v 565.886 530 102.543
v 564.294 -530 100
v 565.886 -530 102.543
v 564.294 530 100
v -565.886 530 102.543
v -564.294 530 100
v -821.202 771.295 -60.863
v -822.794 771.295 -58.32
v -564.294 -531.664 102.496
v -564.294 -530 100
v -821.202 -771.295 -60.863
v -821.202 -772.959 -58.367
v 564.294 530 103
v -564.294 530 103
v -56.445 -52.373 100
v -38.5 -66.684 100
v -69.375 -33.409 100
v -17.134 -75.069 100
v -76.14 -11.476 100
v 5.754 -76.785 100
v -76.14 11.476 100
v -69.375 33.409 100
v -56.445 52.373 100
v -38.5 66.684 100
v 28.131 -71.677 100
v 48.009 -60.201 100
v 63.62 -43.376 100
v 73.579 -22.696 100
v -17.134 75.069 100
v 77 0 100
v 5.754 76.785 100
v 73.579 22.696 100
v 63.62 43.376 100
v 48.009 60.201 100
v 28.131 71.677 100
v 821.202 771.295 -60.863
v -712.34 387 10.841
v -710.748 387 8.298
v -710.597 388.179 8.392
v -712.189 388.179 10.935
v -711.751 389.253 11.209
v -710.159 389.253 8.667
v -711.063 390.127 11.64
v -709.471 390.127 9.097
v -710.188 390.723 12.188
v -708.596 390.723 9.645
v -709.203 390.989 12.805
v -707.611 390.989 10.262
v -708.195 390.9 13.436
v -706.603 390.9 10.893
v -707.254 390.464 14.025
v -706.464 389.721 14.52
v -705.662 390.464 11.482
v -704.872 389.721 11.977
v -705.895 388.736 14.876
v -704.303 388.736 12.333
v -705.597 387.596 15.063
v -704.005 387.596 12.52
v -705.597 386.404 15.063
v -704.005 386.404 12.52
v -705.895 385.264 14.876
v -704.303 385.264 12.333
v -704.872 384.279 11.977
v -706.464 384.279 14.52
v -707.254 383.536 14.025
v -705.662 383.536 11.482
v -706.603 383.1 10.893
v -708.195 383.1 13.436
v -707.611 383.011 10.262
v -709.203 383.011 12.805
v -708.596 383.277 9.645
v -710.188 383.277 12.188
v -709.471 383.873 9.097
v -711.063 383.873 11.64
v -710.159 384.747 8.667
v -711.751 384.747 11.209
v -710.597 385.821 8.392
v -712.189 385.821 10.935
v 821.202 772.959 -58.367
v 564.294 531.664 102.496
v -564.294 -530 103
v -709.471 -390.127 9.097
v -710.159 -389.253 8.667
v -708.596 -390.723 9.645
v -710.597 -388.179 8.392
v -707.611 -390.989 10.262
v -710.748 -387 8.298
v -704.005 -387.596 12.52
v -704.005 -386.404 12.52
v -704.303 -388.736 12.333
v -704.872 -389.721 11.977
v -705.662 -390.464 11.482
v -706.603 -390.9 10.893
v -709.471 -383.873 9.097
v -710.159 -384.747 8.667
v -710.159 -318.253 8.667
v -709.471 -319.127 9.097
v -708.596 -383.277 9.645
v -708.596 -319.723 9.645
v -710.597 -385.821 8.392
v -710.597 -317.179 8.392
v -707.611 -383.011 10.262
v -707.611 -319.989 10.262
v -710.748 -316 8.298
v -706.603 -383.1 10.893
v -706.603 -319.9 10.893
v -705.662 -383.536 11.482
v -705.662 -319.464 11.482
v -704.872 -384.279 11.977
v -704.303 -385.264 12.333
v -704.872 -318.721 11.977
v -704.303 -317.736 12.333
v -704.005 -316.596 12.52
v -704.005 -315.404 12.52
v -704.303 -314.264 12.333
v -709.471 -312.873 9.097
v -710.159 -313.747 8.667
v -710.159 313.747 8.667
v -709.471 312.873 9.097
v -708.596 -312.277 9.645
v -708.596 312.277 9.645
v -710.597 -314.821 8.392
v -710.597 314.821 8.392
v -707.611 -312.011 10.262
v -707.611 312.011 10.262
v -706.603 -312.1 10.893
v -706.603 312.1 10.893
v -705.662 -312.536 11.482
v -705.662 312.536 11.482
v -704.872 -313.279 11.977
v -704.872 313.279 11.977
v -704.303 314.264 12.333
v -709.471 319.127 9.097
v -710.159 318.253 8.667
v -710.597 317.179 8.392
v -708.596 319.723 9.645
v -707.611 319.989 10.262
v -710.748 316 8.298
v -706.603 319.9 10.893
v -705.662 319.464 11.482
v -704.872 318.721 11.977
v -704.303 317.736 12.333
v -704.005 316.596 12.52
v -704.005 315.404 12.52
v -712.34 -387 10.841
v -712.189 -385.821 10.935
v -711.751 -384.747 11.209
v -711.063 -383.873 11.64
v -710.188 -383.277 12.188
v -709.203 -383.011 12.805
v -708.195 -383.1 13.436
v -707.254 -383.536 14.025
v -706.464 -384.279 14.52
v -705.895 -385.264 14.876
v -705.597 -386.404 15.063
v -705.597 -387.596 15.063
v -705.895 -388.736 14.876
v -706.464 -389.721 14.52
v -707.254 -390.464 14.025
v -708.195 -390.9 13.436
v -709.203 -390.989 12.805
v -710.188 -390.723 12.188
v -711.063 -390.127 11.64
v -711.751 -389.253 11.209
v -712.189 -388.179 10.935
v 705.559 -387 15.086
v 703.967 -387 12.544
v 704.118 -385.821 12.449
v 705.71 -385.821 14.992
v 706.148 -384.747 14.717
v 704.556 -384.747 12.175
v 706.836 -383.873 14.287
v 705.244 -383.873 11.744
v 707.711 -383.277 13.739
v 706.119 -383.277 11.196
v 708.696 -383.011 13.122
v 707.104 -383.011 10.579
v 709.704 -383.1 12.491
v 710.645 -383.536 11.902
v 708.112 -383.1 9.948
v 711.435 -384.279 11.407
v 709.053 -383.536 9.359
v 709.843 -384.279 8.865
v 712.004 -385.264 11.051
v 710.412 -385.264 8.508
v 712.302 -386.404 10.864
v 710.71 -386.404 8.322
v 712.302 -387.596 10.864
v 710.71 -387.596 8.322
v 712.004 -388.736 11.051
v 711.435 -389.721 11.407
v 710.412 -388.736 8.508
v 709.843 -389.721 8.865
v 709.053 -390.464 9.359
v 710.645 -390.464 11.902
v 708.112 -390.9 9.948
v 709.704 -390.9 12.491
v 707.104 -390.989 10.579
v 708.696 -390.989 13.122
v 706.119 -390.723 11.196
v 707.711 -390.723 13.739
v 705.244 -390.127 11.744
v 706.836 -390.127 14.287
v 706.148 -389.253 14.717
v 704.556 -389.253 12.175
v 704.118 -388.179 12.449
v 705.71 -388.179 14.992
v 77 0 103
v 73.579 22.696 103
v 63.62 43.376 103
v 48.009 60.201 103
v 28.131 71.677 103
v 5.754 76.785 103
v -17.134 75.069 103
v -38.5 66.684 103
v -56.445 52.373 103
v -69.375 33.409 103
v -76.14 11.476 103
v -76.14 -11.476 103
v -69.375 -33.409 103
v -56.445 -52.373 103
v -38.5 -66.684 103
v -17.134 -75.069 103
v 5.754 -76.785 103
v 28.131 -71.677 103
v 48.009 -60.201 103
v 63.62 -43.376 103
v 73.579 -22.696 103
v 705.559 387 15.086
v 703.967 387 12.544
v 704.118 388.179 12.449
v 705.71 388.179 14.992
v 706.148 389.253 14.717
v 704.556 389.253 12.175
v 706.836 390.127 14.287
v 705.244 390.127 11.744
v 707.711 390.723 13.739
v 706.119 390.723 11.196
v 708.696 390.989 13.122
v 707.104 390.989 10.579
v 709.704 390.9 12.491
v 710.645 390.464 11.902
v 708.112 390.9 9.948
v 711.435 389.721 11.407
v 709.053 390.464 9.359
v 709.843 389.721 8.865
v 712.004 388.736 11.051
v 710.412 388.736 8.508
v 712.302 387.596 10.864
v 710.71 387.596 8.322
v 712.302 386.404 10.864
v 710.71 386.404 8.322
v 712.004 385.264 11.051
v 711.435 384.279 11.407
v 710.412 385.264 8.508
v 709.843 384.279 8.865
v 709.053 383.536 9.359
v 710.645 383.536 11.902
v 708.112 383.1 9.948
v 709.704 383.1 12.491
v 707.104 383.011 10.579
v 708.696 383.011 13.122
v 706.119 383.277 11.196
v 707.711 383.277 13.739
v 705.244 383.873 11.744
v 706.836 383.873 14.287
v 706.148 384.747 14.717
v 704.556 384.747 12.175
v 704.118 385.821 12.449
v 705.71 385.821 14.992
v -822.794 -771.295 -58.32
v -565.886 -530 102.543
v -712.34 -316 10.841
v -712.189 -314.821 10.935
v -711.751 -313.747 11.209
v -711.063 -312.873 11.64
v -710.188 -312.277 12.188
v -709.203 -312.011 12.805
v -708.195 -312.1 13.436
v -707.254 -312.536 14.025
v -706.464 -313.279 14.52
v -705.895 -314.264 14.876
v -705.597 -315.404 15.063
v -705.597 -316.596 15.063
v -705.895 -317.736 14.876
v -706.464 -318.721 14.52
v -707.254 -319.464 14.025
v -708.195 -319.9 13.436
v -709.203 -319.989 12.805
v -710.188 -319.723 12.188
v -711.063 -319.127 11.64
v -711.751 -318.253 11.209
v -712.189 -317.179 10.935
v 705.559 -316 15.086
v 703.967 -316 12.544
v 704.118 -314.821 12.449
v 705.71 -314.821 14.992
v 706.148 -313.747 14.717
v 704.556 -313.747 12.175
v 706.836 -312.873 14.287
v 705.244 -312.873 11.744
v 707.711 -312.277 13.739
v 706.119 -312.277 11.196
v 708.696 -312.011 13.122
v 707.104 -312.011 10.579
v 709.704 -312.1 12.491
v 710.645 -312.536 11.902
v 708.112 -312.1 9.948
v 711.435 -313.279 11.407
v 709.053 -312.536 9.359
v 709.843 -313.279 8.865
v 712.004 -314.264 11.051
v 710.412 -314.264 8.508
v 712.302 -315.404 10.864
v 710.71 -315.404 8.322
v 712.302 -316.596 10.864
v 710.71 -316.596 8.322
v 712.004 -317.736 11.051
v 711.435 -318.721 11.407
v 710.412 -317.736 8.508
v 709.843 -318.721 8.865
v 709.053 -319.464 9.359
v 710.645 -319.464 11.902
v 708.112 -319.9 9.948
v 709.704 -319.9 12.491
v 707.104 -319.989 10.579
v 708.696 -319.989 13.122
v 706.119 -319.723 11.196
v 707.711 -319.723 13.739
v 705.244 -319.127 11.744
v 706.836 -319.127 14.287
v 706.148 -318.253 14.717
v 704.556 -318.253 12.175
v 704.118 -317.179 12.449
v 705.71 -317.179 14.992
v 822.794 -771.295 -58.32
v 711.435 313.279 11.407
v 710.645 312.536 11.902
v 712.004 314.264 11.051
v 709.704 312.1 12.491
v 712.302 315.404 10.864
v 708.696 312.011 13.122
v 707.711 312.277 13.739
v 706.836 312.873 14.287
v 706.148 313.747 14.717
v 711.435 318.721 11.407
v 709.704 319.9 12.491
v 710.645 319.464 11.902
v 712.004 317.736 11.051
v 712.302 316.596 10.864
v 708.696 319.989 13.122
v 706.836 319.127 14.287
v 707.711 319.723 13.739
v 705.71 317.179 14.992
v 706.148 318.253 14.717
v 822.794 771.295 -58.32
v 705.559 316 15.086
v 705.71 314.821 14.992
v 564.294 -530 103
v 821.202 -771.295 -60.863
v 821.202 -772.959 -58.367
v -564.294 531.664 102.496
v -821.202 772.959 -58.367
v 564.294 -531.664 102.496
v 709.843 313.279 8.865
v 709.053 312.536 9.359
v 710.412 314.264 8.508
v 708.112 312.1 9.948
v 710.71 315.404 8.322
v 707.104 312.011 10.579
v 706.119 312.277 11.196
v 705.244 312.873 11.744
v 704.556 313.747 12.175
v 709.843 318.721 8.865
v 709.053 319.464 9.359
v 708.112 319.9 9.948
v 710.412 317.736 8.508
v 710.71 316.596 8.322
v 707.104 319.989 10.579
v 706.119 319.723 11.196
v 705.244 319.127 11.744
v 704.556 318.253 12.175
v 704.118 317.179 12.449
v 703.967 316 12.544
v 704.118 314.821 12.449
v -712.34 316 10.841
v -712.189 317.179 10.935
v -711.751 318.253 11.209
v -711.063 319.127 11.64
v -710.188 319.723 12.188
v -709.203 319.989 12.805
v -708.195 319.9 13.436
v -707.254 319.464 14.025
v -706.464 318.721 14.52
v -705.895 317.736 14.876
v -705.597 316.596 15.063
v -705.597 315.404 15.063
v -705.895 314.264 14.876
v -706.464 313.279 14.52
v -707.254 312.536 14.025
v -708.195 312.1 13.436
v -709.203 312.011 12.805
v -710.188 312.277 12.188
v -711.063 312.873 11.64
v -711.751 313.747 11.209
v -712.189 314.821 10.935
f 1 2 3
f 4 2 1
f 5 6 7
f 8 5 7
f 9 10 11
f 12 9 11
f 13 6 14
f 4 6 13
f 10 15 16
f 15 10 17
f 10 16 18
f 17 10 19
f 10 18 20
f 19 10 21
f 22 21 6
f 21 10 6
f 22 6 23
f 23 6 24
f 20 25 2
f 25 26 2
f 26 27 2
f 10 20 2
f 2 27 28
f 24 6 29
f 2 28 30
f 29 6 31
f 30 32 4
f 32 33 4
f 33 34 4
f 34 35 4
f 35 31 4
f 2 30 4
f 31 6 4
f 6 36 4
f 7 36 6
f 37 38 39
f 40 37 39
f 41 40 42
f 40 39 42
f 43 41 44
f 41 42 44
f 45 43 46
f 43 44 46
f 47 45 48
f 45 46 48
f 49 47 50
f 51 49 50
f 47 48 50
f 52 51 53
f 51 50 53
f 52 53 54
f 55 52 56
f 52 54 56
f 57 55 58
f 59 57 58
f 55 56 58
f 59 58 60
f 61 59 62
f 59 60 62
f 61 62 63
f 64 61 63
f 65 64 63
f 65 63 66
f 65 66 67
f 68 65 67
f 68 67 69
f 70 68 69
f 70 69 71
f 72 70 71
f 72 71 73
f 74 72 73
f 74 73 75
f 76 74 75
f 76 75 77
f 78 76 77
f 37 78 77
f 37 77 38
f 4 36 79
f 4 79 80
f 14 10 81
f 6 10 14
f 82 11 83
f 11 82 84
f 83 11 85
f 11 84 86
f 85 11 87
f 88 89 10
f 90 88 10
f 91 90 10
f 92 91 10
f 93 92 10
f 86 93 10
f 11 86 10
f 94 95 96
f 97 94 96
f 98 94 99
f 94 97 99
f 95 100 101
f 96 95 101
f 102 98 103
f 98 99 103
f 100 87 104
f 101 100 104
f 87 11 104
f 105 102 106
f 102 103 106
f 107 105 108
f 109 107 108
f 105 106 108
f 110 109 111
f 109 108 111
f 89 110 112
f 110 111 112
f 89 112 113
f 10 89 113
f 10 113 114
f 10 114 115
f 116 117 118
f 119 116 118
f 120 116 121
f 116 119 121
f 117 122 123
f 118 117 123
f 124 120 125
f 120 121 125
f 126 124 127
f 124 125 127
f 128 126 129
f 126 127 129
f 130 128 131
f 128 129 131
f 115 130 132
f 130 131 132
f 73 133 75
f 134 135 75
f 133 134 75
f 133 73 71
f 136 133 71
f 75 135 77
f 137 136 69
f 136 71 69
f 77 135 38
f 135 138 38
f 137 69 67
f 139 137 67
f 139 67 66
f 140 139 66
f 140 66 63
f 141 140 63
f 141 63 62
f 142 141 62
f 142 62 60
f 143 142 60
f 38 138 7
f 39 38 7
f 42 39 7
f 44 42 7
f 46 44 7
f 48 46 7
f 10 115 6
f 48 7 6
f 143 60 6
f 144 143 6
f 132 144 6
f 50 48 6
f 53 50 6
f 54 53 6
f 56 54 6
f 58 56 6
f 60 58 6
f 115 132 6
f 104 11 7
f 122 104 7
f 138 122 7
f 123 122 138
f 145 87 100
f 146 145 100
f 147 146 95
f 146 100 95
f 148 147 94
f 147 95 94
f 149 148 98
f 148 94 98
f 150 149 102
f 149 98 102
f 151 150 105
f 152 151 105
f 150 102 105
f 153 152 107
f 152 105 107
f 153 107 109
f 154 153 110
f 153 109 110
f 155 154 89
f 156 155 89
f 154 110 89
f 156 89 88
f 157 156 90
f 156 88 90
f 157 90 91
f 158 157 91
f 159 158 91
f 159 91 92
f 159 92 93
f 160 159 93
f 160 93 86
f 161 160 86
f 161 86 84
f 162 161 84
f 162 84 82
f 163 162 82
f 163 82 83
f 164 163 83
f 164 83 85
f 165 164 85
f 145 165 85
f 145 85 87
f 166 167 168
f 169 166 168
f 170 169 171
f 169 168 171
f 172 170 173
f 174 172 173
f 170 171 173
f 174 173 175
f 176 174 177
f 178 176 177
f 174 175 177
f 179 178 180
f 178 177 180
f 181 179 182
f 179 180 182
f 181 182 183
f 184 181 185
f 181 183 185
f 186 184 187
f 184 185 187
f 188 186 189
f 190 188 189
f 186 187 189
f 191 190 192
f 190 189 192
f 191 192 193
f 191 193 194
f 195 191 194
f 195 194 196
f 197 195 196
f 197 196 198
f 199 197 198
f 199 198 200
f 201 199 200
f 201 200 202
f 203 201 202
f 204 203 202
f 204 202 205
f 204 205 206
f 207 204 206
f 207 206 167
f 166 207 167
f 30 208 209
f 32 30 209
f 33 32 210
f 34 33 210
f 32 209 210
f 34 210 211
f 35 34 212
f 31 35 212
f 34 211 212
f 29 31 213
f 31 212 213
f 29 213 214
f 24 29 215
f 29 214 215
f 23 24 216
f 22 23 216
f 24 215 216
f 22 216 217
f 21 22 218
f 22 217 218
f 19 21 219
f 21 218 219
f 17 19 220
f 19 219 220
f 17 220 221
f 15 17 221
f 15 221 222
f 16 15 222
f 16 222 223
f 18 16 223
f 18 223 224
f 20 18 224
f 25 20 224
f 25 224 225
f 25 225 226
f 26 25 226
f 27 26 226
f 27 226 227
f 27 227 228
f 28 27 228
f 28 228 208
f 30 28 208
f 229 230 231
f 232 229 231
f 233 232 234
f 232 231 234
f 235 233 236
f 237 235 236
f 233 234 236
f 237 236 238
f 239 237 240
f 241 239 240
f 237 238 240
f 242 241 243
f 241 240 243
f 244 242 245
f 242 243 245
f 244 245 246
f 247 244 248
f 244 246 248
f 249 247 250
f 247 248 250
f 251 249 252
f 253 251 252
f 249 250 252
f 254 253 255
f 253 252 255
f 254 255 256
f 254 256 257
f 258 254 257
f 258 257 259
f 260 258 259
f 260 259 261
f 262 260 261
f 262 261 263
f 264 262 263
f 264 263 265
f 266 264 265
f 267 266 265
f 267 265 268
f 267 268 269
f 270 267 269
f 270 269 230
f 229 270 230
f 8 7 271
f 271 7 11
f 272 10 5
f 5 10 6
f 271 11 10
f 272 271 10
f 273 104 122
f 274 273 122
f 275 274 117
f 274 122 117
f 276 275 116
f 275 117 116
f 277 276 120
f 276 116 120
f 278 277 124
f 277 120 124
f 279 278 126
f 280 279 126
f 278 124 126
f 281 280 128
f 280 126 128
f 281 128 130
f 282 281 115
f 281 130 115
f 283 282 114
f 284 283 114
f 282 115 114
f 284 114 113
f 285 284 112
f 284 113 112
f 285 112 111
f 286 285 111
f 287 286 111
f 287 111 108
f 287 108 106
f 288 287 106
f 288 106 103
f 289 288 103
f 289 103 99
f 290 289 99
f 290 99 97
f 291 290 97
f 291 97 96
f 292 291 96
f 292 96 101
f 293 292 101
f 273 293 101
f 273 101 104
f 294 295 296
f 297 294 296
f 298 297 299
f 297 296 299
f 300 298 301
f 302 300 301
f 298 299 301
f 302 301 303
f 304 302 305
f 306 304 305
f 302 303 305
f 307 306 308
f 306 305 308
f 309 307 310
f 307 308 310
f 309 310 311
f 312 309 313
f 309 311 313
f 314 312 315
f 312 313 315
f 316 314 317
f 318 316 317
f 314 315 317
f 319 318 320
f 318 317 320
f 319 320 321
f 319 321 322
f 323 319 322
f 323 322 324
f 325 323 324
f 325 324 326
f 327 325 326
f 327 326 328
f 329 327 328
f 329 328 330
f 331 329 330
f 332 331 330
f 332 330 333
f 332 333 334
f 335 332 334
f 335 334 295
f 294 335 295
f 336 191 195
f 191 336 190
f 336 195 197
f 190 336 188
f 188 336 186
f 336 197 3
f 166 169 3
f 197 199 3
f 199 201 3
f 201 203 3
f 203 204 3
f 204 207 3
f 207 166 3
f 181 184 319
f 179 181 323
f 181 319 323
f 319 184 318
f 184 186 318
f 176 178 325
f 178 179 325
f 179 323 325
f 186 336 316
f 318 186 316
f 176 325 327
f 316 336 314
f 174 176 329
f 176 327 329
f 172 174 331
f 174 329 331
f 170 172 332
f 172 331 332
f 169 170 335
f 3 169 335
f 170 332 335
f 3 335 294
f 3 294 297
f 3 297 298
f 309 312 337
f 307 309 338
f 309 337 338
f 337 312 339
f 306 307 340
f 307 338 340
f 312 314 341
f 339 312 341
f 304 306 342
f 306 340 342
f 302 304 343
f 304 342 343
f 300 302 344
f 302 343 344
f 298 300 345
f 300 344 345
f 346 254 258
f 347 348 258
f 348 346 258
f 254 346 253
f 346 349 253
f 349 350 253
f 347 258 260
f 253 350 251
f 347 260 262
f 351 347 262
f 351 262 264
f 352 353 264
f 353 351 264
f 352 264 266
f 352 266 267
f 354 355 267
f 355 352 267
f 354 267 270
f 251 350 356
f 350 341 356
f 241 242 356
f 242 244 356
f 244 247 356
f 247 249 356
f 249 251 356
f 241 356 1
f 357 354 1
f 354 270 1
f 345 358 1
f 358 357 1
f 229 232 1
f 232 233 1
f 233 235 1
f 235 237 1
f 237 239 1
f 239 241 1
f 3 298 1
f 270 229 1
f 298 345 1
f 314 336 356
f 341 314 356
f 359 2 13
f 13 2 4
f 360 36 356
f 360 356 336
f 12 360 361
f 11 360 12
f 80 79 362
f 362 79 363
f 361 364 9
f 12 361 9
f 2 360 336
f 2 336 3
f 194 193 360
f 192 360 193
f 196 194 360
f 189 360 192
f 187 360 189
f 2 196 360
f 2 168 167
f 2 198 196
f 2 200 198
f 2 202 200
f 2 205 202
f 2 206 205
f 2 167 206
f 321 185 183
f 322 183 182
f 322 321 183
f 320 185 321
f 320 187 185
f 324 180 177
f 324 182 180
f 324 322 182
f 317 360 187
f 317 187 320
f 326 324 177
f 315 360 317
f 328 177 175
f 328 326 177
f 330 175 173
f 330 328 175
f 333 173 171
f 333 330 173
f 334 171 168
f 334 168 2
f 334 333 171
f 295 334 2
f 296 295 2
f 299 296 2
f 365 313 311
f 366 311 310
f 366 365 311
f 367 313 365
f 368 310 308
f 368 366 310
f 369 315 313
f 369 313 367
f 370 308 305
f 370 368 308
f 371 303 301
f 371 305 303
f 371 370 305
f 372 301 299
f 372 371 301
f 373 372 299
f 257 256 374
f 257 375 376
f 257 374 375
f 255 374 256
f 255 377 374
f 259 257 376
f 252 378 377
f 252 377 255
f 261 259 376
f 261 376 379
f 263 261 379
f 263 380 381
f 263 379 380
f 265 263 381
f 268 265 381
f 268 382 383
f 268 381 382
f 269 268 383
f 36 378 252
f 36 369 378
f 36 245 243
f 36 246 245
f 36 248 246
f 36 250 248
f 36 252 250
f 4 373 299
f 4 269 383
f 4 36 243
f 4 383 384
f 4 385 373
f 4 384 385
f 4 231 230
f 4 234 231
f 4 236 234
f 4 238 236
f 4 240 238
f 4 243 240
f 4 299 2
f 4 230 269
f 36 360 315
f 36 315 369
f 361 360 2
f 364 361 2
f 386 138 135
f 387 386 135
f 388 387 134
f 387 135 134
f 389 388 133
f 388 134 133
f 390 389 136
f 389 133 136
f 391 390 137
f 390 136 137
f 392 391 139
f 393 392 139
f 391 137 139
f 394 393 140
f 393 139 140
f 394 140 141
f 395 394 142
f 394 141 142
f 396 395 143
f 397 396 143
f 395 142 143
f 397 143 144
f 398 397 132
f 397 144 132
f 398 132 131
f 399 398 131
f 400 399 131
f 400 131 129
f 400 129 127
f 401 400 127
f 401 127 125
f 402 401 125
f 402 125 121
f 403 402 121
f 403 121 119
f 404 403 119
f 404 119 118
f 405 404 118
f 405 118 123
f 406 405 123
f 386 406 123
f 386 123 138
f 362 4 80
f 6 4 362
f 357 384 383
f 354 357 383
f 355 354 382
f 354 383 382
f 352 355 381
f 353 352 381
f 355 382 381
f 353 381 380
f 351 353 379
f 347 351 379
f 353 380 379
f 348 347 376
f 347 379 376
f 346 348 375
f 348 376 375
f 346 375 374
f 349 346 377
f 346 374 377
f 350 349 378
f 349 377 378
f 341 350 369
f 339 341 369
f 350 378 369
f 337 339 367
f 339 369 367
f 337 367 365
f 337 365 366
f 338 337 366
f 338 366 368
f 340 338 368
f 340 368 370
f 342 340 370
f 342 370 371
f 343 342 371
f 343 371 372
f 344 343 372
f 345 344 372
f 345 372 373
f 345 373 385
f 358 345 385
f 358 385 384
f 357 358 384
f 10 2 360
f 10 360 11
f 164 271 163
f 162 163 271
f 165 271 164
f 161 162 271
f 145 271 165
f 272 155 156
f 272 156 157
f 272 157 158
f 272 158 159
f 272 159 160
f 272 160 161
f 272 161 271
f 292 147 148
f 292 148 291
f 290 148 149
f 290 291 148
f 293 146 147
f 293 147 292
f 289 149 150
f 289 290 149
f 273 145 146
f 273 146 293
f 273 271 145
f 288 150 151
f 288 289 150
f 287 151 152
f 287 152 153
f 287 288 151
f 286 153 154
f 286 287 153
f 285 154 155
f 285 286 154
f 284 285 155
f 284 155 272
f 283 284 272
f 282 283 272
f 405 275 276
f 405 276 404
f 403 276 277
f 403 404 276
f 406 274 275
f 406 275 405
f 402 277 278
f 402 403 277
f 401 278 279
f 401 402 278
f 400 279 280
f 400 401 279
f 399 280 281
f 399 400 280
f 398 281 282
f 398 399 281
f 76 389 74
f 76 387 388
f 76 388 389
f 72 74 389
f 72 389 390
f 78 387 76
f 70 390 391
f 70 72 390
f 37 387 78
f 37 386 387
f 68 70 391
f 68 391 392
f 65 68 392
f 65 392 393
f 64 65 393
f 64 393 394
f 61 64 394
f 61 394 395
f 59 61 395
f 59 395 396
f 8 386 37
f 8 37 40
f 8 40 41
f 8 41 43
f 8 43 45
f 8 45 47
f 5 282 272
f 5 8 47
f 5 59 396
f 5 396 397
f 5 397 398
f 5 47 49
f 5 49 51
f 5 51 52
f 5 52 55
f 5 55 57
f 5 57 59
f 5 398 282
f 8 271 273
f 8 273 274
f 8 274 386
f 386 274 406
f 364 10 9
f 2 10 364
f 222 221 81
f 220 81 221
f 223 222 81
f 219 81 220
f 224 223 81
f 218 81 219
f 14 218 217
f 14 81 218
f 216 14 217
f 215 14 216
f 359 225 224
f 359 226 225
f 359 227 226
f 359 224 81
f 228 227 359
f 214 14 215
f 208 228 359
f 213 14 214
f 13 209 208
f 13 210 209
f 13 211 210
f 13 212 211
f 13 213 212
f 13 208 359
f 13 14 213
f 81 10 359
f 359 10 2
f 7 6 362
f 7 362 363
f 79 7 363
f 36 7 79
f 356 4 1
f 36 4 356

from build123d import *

# Parameters (mm, degrees)
BOSS_EXTRUDE1_DEPTH = 3
BOSS_EXTRUDE2_DEPTH = 3
BOSS_EXTRUDE3_DEPTH = 3
BOSS_EXTRUDE4_DEPTH = 3
SKETCH7_W           = 1128.588235294
SKETCH7_H           = 1060
BOSS_EXTRUDE5_DEPTH = 3
SKETCH9_R           = 4
CUT_EXTRUDE2_DEPTH  = 1343.006459444
SKETCH10_R          = 4
CUT_EXTRUDE3_DEPTH  = 1343.006459444
SKETCH11_R          = 77
CUT_EXTRUDE4_DEPTH  = 1141.74807468


with BuildPart() as part:
    # Sketch3 → Boss-Extrude1 (new body)
    with BuildSketch(Plane(origin=(0, -209.230769231, 313.846153846), x_dir=(1, 0, 0), z_dir=(0, -0.554700196225229, 0.8320502943378437))):
        Polygon((-564.294117647, -385.516636377), (564.294117647, -385.516636377), (724, -565.79420015), (821.201882058, -675.516636377), (-821.201882058, -675.516636377), (-724, -565.79420015), align=None)
    extrude(amount=BOSS_EXTRUDE1_DEPTH)


with BuildPart() as body_2:
    # Sketch4 → Boss-Extrude2 (new body)
    with BuildSketch(Plane(origin=(-203.909377292, 0, 325.655270204), x_dir=(-0.8475595635030612, 0, -0.5307002791731887), z_dir=(0.5307002791731887, 0, -0.8475595635030612))):
        Polygon((425.202848123, -530), (425.202848123, 530), (728.317549996, 771.294585358), (728.317549996, -771.294585358), align=None)
    extrude(amount=-BOSS_EXTRUDE2_DEPTH)

    # Sketch10 → Cut-Extrude3 (cut, through all)
    with BuildSketch(Plane(origin=(-203.909377292, 0, 325.655270204), x_dir=(-0.8475595635030612, 0, -0.5307002791731887), z_dir=(0.5307002791731887, 0, -0.8475595635030612))):
        with Locations((593.997278026, -387)):
            Circle(SKETCH10_R)
        with Locations((593.997278026, -316)):
            Circle(SKETCH10_R)
        with Locations((593.997278026, 316)):
            Circle(SKETCH10_R)
        with Locations((593.997278026, 387)):
            Circle(SKETCH10_R)
    extrude(amount=-CUT_EXTRUDE3_DEPTH, mode=Mode.SUBTRACT)


with BuildPart() as body_3:
    # Sketch5 → Boss-Extrude3 (new body)
    with BuildSketch(Plane(origin=(203.909377292, 0, 325.655270204), x_dir=(0.8475595635030614, 0, -0.5307002791731884), z_dir=(0.5307002791731884, 0, 0.8475595635030614))):
        Polygon((425.202848123, -530), (425.202848123, 530), (728.317549996, 771.294585358), (728.317549996, -771.294585358), align=None)
    extrude(amount=BOSS_EXTRUDE3_DEPTH)

    # Sketch9 → Cut-Extrude2 (cut, through all)
    with BuildSketch(Plane(origin=(203.909377292, 0, 325.655270204), x_dir=(-0.8475595635030615, 0, 0.5307002791731884), z_dir=(-0.5307002791731884, 0, -0.8475595635030615))):
        with Locations((-593.997278026, 387)):
            Circle(SKETCH9_R)
        with Locations((-593.997278026, 316)):
            Circle(SKETCH9_R)
        with Locations((-593.997278026, -316)):
            Circle(SKETCH9_R)
        with Locations((-593.997278026, -387)):
            Circle(SKETCH9_R)
    extrude(amount=-CUT_EXTRUDE2_DEPTH, mode=Mode.SUBTRACT)


with BuildPart() as body_4:
    # Sketch6 → Boss-Extrude4 (new body)
    with BuildSketch(Plane(origin=(0, 209.230769231, 313.846153846), x_dir=(-1, 0, 0), z_dir=(0, -0.554700196225229, -0.8320502943378437))):
        Polygon((-564.294117647, 385.516636377), (564.294117647, 385.516636377), (821.201882058, 675.516636377), (-821.201882058, 675.516636377), align=None)
    extrude(amount=-BOSS_EXTRUDE4_DEPTH)


with BuildPart() as body_5:
    # Sketch7 → Boss-Extrude5 (new body)
    with BuildSketch(Plane.XY.offset(100)):
        Rectangle(SKETCH7_W, SKETCH7_H)
    extrude(amount=BOSS_EXTRUDE5_DEPTH)

    # Sketch11 → Cut-Extrude4 (cut, through all)
    with BuildSketch(Plane.XY.offset(103)):
        Circle(SKETCH11_R)
    extrude(amount=-CUT_EXTRUDE4_DEPTH, mode=Mode.SUBTRACT)


solid = Compound([part.part, body_2.part, body_3.part, body_4.part, body_5.part])
